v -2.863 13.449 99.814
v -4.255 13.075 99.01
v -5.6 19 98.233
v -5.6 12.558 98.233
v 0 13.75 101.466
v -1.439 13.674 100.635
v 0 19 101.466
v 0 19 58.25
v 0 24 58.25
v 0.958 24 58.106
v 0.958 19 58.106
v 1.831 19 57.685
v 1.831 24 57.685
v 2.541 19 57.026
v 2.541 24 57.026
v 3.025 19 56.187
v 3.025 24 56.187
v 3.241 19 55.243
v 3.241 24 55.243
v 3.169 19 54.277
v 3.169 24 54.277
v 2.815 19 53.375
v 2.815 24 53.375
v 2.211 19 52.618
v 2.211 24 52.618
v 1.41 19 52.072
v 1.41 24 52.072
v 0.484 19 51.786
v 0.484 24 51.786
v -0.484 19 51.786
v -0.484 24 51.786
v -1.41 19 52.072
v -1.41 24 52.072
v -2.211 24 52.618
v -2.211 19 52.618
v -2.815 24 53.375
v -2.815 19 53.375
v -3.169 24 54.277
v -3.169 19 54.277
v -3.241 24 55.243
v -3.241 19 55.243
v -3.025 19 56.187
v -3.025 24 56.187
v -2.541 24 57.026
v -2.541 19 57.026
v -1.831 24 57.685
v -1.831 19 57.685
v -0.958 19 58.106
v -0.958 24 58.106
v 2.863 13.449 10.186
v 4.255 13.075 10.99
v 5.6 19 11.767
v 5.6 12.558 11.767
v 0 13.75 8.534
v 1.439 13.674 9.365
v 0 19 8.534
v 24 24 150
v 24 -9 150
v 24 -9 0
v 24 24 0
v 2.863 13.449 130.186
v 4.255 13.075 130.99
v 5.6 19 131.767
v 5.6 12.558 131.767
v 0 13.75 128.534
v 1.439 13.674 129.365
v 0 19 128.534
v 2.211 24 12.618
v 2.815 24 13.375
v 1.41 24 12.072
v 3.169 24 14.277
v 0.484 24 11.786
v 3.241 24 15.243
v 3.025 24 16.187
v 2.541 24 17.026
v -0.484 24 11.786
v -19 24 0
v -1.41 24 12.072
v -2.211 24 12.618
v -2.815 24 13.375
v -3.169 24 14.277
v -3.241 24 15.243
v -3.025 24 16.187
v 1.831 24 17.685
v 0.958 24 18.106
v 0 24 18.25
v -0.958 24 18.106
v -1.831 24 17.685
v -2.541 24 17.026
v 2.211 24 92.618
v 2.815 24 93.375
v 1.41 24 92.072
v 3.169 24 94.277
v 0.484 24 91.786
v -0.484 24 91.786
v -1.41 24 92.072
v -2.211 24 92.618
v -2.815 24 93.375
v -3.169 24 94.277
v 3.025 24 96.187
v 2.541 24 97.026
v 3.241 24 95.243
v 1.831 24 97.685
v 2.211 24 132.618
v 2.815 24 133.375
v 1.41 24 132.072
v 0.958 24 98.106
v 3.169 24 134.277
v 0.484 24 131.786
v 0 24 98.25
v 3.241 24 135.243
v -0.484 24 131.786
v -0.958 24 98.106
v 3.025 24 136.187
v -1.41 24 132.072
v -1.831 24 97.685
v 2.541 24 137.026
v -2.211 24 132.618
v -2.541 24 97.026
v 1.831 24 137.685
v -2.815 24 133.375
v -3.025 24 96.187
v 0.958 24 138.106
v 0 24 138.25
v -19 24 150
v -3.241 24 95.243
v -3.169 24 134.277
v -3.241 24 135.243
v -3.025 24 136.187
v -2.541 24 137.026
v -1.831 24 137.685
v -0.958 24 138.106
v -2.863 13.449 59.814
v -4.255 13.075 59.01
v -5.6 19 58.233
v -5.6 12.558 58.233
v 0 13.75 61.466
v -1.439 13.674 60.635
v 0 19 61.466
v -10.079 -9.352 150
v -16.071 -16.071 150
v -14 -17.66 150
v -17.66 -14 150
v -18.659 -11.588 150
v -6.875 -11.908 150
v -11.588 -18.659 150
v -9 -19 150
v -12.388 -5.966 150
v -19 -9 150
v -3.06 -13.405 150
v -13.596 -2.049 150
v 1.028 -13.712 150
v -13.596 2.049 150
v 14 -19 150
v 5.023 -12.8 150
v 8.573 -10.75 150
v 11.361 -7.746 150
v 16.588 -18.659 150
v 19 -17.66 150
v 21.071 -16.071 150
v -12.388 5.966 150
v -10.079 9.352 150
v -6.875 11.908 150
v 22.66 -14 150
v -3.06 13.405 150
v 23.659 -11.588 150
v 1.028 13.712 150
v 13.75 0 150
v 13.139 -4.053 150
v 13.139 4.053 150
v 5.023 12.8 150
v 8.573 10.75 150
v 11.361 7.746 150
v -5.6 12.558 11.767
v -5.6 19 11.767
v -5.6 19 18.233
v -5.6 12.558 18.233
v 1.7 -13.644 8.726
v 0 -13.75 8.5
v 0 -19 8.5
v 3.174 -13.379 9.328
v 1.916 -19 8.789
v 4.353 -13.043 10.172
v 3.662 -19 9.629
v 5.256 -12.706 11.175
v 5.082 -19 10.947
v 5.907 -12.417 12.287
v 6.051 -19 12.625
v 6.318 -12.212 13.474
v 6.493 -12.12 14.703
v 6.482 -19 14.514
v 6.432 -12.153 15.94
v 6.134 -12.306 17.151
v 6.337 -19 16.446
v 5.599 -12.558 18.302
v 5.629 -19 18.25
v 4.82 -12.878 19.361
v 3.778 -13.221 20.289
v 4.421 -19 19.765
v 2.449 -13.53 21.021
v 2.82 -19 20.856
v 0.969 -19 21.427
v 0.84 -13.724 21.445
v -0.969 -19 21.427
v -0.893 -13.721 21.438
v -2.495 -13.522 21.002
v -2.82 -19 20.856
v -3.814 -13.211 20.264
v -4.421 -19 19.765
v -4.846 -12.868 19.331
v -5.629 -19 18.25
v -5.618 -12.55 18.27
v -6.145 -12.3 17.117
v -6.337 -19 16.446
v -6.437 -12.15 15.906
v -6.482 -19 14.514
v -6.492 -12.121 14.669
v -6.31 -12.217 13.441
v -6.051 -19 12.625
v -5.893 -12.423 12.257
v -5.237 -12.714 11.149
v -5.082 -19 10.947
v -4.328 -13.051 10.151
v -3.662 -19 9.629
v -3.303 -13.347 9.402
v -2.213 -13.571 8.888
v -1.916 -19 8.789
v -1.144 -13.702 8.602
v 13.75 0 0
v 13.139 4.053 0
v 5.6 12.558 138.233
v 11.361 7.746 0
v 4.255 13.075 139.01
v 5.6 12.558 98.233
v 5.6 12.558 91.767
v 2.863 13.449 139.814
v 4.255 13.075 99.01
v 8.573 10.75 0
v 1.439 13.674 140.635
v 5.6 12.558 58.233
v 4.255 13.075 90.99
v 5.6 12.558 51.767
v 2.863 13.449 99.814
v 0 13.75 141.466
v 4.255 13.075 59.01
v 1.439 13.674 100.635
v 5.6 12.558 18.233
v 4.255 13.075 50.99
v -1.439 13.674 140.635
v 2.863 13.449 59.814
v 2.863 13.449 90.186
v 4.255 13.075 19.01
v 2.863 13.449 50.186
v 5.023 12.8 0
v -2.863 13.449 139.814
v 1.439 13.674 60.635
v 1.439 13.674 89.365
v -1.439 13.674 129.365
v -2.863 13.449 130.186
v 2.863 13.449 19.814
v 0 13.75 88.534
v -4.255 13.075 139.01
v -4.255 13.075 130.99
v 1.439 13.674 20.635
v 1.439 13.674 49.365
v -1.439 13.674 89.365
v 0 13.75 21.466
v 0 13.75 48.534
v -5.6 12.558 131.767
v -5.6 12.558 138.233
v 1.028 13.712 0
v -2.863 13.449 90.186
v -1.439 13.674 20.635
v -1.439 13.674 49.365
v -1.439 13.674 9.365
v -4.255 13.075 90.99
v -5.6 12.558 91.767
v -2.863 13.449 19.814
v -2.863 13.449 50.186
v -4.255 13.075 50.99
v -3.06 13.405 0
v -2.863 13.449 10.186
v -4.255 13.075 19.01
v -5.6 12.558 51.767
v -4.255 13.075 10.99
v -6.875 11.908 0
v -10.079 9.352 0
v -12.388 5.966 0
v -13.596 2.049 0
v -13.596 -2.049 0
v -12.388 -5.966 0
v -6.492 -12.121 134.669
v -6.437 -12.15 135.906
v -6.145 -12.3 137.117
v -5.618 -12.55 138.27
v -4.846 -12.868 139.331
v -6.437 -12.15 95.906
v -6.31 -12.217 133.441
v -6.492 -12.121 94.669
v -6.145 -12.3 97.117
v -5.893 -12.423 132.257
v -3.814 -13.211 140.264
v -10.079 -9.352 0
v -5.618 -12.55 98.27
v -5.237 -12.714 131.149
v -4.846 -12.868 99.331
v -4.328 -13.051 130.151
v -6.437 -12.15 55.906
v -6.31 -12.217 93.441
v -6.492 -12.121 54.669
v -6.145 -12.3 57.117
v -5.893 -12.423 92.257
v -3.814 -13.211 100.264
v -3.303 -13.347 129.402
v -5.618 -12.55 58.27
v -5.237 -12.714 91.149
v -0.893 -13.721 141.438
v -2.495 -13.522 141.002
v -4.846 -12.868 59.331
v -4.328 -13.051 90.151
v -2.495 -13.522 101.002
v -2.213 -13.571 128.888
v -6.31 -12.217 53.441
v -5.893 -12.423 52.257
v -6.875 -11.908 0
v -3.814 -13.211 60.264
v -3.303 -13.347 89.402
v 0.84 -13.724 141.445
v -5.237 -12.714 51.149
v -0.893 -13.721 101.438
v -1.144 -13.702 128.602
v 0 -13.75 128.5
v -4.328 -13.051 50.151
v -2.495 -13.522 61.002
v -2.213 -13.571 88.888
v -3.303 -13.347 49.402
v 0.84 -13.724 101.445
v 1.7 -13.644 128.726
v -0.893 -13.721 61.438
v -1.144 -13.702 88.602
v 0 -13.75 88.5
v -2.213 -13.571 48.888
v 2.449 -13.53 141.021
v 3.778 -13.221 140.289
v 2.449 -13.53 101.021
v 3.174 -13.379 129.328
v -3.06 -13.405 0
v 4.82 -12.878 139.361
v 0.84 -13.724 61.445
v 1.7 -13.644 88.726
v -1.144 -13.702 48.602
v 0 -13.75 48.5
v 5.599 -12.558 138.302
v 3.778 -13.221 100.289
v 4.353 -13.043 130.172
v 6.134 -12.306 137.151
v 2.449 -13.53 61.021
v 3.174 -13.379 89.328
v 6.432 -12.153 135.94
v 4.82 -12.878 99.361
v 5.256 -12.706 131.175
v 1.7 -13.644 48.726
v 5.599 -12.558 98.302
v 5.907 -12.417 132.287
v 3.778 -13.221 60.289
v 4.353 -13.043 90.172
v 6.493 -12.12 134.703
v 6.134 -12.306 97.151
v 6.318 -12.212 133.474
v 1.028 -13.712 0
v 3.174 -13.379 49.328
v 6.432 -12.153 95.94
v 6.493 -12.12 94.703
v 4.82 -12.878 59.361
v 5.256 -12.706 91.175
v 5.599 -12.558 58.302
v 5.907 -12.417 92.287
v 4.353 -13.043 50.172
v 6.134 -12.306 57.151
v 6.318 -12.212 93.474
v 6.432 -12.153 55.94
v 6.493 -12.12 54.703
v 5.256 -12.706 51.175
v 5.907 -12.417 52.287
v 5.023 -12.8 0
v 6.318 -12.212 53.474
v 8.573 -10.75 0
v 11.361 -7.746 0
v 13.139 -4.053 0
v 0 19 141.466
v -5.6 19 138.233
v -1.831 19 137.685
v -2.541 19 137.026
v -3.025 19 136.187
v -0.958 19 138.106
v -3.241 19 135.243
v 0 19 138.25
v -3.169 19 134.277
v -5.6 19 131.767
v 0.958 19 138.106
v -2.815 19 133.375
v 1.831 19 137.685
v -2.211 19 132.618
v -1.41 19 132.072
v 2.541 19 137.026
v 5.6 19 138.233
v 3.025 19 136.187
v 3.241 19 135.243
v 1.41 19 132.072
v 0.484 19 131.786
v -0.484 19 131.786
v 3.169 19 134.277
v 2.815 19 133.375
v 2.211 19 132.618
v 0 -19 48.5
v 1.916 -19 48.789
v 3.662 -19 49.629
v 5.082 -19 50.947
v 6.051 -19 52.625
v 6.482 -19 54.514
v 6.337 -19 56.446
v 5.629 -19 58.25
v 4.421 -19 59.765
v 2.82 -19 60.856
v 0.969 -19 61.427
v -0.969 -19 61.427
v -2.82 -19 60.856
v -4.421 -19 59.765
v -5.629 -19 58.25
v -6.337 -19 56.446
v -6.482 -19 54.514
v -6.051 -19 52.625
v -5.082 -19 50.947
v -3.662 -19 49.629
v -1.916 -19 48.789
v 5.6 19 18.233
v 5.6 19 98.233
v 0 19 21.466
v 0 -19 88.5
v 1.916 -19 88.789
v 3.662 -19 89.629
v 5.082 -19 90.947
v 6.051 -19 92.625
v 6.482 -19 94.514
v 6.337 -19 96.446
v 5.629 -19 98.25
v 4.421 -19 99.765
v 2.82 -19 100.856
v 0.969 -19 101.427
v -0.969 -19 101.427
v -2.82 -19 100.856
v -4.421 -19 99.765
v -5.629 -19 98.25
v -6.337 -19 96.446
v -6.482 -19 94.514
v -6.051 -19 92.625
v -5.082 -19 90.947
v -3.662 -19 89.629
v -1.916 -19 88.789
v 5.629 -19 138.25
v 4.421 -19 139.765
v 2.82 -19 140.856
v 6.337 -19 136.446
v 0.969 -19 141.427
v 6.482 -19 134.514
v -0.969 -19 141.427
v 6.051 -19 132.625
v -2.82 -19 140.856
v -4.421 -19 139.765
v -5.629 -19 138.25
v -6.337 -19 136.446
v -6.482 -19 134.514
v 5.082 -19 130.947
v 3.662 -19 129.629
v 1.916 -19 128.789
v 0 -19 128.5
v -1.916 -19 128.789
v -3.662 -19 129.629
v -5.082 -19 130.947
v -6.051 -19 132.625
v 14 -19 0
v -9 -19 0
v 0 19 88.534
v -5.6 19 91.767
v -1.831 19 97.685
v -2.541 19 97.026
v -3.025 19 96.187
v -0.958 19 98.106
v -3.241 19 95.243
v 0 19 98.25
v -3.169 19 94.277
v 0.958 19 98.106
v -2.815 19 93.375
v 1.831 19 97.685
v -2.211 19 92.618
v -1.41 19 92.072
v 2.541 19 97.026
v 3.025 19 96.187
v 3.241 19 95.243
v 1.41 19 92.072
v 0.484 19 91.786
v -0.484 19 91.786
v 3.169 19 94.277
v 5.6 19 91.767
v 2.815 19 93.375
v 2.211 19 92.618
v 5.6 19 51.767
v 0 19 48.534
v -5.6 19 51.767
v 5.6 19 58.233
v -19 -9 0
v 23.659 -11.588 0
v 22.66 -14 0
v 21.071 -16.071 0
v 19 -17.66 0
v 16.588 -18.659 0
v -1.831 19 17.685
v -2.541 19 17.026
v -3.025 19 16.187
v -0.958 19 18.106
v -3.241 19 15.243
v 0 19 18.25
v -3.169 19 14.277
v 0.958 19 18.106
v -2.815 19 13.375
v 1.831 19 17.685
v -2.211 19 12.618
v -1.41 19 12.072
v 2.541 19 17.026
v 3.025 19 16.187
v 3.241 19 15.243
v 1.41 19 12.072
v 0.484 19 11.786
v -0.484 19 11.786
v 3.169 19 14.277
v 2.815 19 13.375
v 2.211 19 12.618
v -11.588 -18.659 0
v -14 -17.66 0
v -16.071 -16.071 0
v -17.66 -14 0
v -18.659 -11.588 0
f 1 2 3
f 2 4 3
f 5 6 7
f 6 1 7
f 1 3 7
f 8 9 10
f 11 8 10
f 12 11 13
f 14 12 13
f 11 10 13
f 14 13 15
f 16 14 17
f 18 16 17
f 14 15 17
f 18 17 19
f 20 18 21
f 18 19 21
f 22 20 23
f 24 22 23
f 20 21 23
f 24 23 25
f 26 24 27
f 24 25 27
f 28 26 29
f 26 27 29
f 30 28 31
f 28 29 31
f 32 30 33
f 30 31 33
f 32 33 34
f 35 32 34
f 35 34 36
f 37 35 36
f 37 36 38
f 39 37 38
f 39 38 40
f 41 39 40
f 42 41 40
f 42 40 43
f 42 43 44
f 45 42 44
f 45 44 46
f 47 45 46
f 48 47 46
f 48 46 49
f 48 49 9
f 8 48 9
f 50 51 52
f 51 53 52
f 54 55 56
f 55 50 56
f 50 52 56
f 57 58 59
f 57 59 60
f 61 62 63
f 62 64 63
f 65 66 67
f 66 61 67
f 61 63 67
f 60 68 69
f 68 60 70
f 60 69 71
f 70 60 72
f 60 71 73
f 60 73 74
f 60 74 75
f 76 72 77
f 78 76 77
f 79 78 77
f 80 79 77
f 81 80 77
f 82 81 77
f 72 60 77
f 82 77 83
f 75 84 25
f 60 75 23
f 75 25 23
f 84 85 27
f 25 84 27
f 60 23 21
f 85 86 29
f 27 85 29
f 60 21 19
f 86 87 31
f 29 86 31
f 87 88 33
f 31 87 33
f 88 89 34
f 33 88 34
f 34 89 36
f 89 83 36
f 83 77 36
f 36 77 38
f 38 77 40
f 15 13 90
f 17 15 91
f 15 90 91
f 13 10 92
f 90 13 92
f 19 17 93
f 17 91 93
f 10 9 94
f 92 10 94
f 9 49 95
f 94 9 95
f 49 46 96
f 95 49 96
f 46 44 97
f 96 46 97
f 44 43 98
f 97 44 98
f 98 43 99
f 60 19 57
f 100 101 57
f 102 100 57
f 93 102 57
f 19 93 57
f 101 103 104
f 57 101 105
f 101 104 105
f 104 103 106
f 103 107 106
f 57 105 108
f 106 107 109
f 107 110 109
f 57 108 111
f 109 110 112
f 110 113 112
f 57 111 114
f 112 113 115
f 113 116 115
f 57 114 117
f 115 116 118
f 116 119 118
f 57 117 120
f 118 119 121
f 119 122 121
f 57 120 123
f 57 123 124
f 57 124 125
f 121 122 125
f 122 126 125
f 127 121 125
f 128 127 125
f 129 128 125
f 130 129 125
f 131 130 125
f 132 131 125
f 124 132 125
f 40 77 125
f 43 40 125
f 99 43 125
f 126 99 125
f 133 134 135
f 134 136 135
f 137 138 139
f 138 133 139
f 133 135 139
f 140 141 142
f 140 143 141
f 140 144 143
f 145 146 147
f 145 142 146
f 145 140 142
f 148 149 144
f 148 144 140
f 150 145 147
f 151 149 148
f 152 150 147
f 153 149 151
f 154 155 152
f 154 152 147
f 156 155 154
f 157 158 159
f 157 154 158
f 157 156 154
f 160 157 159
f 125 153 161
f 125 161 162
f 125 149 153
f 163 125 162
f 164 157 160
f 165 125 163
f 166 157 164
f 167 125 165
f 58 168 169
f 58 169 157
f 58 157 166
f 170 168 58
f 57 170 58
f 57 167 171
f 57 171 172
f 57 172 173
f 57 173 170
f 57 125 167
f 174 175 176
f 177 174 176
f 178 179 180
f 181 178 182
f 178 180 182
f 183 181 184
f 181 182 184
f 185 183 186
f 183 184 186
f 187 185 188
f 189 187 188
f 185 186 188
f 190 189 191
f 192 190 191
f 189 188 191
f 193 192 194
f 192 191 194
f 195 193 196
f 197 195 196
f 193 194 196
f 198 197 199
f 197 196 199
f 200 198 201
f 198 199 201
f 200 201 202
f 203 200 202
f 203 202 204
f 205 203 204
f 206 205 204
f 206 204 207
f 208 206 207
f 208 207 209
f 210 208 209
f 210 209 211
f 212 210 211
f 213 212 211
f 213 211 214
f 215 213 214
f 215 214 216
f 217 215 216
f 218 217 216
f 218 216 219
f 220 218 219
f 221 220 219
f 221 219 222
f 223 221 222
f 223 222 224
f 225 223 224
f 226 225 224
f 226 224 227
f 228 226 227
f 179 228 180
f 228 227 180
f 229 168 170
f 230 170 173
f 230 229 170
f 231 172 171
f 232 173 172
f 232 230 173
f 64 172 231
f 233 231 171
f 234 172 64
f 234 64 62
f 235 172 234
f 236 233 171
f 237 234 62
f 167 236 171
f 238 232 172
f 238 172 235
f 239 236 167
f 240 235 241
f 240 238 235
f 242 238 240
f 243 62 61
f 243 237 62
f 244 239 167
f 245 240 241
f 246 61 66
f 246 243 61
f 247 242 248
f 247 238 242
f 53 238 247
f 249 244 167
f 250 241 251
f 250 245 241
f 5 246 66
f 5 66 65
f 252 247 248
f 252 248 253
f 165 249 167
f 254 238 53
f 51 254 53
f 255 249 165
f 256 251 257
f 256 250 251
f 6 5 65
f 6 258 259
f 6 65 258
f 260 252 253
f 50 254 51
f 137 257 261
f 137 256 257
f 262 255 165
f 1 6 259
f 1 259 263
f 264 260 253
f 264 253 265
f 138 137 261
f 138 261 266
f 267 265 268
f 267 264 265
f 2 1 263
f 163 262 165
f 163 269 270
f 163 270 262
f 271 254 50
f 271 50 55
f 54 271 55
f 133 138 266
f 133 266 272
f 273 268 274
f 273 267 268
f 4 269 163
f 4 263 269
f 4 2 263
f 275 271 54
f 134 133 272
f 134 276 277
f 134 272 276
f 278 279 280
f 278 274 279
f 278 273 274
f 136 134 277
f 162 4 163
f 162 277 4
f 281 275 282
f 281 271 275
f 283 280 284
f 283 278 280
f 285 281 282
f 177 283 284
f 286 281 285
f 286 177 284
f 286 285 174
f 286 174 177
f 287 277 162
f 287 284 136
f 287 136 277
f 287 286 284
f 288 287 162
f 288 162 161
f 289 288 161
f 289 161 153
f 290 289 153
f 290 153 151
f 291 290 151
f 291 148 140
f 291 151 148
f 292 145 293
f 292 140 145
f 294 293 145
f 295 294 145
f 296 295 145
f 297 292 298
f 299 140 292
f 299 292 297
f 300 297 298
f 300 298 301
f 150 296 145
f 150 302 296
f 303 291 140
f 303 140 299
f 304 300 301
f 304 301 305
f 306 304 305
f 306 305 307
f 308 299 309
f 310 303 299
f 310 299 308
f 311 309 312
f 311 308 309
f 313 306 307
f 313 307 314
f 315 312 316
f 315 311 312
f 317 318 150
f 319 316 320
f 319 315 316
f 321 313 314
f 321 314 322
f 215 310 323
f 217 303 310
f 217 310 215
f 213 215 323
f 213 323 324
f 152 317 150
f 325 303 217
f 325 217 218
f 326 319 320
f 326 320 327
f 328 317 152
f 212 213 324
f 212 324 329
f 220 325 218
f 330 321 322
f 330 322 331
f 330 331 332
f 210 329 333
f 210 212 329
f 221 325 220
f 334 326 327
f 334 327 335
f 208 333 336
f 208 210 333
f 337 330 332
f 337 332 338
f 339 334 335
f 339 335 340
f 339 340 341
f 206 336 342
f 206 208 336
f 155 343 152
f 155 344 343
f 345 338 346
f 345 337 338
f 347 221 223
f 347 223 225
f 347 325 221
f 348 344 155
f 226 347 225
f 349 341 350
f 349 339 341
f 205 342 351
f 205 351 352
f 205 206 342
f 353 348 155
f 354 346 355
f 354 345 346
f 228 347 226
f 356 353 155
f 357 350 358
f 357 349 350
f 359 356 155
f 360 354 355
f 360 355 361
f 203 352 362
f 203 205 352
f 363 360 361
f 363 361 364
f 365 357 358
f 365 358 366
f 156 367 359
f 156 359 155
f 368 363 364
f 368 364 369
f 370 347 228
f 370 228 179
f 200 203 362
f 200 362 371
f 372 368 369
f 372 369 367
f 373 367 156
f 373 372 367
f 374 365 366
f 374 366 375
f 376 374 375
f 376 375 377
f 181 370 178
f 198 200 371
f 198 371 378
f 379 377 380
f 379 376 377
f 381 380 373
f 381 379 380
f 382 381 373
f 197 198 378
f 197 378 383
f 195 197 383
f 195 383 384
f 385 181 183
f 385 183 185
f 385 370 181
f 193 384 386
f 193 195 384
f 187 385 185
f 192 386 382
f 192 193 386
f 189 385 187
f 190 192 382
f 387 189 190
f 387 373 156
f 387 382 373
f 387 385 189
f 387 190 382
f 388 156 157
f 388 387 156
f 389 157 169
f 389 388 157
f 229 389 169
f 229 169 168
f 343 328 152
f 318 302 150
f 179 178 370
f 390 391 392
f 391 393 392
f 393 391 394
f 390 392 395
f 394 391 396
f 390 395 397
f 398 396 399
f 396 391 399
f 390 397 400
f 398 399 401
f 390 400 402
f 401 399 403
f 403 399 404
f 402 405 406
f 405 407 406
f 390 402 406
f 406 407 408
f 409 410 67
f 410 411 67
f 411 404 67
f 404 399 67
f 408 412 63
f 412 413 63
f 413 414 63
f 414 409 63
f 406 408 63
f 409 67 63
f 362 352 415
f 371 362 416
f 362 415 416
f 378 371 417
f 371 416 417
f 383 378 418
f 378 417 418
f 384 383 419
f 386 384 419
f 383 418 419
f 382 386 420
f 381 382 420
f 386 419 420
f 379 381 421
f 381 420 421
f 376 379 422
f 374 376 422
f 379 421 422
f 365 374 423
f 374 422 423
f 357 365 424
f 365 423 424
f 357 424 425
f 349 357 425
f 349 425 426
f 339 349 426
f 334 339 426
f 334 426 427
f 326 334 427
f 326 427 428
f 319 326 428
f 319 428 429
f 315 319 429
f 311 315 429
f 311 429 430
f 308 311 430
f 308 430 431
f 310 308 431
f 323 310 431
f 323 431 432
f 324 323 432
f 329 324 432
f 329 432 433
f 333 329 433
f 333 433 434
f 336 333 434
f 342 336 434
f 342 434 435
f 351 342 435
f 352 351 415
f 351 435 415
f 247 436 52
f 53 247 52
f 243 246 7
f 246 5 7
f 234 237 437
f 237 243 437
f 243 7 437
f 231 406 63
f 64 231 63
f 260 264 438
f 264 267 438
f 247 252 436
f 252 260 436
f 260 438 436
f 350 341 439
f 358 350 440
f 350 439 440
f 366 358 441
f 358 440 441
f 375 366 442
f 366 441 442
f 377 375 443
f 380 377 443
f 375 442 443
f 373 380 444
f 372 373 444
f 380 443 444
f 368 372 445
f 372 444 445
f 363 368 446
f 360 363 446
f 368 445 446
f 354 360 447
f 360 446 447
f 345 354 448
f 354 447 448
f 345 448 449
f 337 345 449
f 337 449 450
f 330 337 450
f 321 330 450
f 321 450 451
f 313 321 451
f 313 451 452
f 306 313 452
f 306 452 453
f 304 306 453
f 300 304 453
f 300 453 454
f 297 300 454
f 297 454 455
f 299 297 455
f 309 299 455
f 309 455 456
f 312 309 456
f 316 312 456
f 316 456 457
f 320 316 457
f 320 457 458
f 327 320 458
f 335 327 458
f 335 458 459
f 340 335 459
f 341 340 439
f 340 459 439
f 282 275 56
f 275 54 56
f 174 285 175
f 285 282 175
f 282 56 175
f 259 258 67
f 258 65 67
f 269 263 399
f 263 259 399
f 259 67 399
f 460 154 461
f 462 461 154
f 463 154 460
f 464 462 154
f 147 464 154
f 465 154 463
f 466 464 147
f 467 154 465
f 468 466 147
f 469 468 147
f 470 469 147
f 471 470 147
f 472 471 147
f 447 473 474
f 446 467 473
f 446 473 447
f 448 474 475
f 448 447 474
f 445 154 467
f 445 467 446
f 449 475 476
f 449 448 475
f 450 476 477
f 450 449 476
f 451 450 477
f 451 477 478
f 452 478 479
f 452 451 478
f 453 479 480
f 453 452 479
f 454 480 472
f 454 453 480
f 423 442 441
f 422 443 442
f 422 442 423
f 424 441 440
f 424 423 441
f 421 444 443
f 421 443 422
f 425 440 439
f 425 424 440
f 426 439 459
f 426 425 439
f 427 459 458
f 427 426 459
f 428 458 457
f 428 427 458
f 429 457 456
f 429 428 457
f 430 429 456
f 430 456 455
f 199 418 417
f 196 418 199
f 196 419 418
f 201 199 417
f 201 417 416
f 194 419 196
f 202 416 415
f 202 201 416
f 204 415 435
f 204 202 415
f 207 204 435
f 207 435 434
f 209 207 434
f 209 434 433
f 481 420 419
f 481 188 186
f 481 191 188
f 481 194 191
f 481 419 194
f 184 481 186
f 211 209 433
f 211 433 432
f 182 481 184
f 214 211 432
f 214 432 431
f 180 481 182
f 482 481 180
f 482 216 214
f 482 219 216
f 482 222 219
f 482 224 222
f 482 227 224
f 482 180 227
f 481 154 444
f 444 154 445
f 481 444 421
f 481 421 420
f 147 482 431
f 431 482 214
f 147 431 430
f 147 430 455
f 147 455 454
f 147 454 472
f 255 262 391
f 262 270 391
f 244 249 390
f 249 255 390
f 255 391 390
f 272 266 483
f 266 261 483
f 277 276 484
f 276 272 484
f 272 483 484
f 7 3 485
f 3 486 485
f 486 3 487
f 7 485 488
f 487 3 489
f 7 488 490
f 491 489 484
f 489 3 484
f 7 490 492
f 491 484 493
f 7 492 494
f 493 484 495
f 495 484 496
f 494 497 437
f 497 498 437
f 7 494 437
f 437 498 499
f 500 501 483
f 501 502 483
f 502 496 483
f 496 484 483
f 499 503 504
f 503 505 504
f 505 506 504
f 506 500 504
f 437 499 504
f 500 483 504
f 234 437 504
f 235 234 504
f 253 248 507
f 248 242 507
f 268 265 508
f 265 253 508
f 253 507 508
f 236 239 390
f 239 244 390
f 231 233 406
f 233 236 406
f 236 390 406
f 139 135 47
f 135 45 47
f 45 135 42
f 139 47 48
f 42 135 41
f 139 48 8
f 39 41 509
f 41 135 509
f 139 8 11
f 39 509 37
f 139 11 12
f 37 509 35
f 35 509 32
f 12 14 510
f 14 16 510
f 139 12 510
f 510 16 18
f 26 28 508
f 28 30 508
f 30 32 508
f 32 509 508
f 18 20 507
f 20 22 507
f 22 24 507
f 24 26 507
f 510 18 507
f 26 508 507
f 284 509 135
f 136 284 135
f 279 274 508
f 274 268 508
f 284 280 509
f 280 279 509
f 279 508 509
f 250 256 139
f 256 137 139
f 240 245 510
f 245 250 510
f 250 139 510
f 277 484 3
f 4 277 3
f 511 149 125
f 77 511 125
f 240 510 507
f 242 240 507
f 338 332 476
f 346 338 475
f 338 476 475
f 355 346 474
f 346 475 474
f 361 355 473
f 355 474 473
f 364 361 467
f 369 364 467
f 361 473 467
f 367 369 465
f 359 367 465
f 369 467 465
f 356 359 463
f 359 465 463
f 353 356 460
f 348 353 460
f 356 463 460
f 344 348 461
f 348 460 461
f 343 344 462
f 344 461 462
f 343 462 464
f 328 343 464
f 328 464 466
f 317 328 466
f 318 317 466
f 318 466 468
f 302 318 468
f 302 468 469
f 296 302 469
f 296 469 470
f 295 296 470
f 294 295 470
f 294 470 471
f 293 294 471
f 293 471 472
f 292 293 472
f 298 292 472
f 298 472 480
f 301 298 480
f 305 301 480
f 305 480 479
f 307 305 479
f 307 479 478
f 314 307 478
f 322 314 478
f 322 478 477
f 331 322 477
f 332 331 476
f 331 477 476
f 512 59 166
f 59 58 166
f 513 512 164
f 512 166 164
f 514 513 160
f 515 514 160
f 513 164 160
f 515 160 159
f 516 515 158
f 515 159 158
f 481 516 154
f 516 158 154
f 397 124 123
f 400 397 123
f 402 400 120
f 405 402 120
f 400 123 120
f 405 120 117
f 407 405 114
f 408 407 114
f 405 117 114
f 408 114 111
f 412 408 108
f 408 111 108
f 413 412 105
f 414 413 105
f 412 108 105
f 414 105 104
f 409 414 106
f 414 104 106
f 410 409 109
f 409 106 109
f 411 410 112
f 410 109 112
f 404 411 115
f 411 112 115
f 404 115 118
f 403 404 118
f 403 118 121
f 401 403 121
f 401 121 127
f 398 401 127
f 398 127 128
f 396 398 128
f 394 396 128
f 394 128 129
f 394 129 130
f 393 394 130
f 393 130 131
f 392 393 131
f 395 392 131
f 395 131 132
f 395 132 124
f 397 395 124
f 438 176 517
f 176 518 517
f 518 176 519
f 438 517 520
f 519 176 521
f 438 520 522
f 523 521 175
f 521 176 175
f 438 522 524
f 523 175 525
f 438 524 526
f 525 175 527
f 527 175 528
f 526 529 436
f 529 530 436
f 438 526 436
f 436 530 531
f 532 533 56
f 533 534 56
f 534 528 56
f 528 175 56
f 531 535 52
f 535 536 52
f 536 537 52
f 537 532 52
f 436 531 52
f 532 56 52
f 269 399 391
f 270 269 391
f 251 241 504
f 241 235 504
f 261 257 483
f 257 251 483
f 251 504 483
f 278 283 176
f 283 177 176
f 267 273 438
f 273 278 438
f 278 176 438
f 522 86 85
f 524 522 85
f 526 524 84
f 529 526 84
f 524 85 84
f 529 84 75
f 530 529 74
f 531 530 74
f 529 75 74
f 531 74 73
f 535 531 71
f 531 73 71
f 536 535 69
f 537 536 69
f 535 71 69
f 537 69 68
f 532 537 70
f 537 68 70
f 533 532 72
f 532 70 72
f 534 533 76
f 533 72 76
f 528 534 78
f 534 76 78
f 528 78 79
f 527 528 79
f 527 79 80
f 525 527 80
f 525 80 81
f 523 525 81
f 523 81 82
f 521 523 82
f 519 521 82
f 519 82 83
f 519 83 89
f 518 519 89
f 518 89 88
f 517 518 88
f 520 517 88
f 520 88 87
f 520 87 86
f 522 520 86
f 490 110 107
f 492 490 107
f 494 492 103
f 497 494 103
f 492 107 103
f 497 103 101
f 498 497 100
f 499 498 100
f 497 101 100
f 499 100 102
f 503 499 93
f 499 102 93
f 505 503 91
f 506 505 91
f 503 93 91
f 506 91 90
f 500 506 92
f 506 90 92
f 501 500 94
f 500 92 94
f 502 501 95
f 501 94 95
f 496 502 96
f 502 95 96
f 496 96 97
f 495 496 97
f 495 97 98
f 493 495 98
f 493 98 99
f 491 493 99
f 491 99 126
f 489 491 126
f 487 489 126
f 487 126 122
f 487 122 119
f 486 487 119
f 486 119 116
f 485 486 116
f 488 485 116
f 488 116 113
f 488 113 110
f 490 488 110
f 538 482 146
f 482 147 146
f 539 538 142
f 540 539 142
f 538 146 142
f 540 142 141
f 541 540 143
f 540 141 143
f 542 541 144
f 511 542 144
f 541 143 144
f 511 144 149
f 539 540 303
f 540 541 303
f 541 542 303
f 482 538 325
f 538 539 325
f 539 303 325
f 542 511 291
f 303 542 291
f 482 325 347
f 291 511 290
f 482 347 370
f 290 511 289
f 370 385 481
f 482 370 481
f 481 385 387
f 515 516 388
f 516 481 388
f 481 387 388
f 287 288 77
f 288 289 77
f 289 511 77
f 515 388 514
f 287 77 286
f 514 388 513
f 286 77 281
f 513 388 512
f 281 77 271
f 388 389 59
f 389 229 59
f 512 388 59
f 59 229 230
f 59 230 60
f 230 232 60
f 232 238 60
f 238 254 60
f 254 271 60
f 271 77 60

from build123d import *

# Parameters (mm, degrees)
SKETCH1_W               = 38
SKETCH1_H               = 48
SKETCH1_R               = 13.75
SKETCH1_H_2             = 10
BOSS_EXTRUDE1_DEPTH     = 230
SKETCH3_R               = 6
CUT_EXTRUDE1_DEPTH      = 0.5
SKETCH4_R               = 3.25
CUT_EXTRUDE2_DEPTH      = 239.706179225
CUT_EXTRUDE3_REACH      = 240.706
CUT_EXTRUDE3_END_RADIUS = 13.75
SKETCH5_R               = 6.5
CUT_EXTRUDE4_REACH      = 243.178
CUT_EXTRUDE4_END_RADIUS = 13.75
CUT_EXTRUDE4_START      = -5
CHAMFER1_SIZE           = 5
SKETCH8_W               = 230
SKETCH8_H               = 1.2
CUT_EXTRUDE6_DEPTH      = 10
SKETCH9_W               = 43
SKETCH9_H               = 80
CUT_EXTRUDE7_DEPTH      = 237.177899168
SKETCH10_W              = 43
SKETCH10_H              = 5
CUT_EXTRUDE8_DEPTH      = 154.792067529
FILLET1_R               = 10


with BuildPart() as part:
    # Sketch1 → Boss-Extrude1 (new body)
    # profile 1 of 3: a face of its own
    with BuildSketch(Plane.XY):
        Rectangle(SKETCH1_W, SKETCH1_H)
        Circle(SKETCH1_R, mode=Mode.SUBTRACT)
    # profile 2 of 3: a face of its own
    with BuildSketch(Plane.XY):
        with Locations((0, 30.2)):
            Rectangle(SKETCH1_W, SKETCH1_H_2)
    # profile 3 of 3: a face of its own
    with BuildSketch(Plane.XY):
        Polygon((19, 24), (19, -24), (24, -24), (24, 35.2), (19, 35.2), (19, 25.2), align=None)
    extrude(amount=BOSS_EXTRUDE1_DEPTH)

    # Sketch3 → Cut-Extrude1 (cut)
    with BuildSketch(Plane(origin=(0, 35.2, 0), x_dir=(1, 0, 0), z_dir=(0, 1, 0))):
        with Locations(Location((0, -15, 0), (0, 0, 270))):
            Circle(SKETCH3_R)
        with Locations(Location((0, -55, 0), (0, 0, 270))):
            Circle(SKETCH3_R)
        with Locations(Location((0, -95, 0), (0, 0, 270))):
            Circle(SKETCH3_R)
        with Locations(Location((0, -135, 0), (0, 0, 270))):
            Circle(SKETCH3_R)
        with Locations(Location((0, -175, 0), (0, 0, 270))):
            Circle(SKETCH3_R)
        with Locations(Location((0, -215, 0), (0, 0, 270))):
            Circle(SKETCH3_R)
    extrude(amount=-CUT_EXTRUDE1_DEPTH, mode=Mode.SUBTRACT)

    # Sketch4 → Cut-Extrude2 (cut, through all)
    with BuildSketch(Plane(origin=(0, 35.2, 0), x_dir=(1, 0, 0), z_dir=(0, 1, 0))):
        with Locations(Location((0, -15, 0), (0, 0, 270))):
            Circle(SKETCH4_R)
        with Locations(Location((0, -55, 0), (0, 0, 270))):
            Circle(SKETCH4_R)
        with Locations(Location((0, -95, 0), (0, 0, 270))):
            Circle(SKETCH4_R)
        with Locations(Location((0, -135, 0), (0, 0, 270))):
            Circle(SKETCH4_R)
        with Locations(Location((0, -175, 0), (0, 0, 270))):
            Circle(SKETCH4_R)
        with Locations(Location((0, -215, 0), (0, 0, 270))):
            Circle(SKETCH4_R)
    extrude(amount=-CUT_EXTRUDE2_DEPTH, mode=Mode.SUBTRACT)

    # Cut-Extrude3: up to this cylinder (the profile starts outside it)
    cut_extrude3_end = Plane(origin=(0, 0, 115), z_dir=(0, 0, -1)) * Cylinder(CUT_EXTRUDE3_END_RADIUS, 709.912, mode=Mode.PRIVATE)
    # Sketch5 → Cut-Extrude3 (cut, up to the surface)
    with BuildSketch(Plane.XZ.offset(24), mode=Mode.PRIVATE) as cut_extrude3_sk1:
        with Locations(Location((0, 215, 0), (0, 0, 270))):
            Circle(SKETCH5_R)
    cut_extrude3_tool1 = extrude(cut_extrude3_sk1.sketch, amount=-CUT_EXTRUDE3_REACH, mode=Mode.PRIVATE) - cut_extrude3_end
    add(cut_extrude3_tool1.solids().sort_by_distance((0, -24, 215))[0], mode=Mode.SUBTRACT)
    # Sketch5 → Cut-Extrude3 (cut, up to the surface)
    with BuildSketch(Plane.XZ.offset(24), mode=Mode.PRIVATE) as cut_extrude3_sk2:
        with Locations(Location((0, 175, 0), (0, 0, 270))):
            Circle(SKETCH5_R)
    cut_extrude3_tool2 = extrude(cut_extrude3_sk2.sketch, amount=-CUT_EXTRUDE3_REACH, mode=Mode.PRIVATE) - cut_extrude3_end
    add(cut_extrude3_tool2.solids().sort_by_distance((0, -24, 175))[0], mode=Mode.SUBTRACT)
    # Sketch5 → Cut-Extrude3 (cut, up to the surface)
    with BuildSketch(Plane.XZ.offset(24), mode=Mode.PRIVATE) as cut_extrude3_sk3:
        with Locations(Location((0, 135, 0), (0, 0, 270))):
            Circle(SKETCH5_R)
    cut_extrude3_tool3 = extrude(cut_extrude3_sk3.sketch, amount=-CUT_EXTRUDE3_REACH, mode=Mode.PRIVATE) - cut_extrude3_end
    add(cut_extrude3_tool3.solids().sort_by_distance((0, -24, 135))[0], mode=Mode.SUBTRACT)
    # Sketch5 → Cut-Extrude3 (cut, up to the surface)
    with BuildSketch(Plane.XZ.offset(24), mode=Mode.PRIVATE) as cut_extrude3_sk4:
        with Locations(Location((0, 95, 0), (0, 0, 270))):
            Circle(SKETCH5_R)
    cut_extrude3_tool4 = extrude(cut_extrude3_sk4.sketch, amount=-CUT_EXTRUDE3_REACH, mode=Mode.PRIVATE) - cut_extrude3_end
    add(cut_extrude3_tool4.solids().sort_by_distance((0, -24, 95))[0], mode=Mode.SUBTRACT)
    # Sketch5 → Cut-Extrude3 (cut, up to the surface)
    with BuildSketch(Plane.XZ.offset(24), mode=Mode.PRIVATE) as cut_extrude3_sk5:
        with Locations(Location((0, 55, 0), (0, 0, 270))):
            Circle(SKETCH5_R)
    cut_extrude3_tool5 = extrude(cut_extrude3_sk5.sketch, amount=-CUT_EXTRUDE3_REACH, mode=Mode.PRIVATE) - cut_extrude3_end
    add(cut_extrude3_tool5.solids().sort_by_distance((0, -24, 55))[0], mode=Mode.SUBTRACT)
    # Sketch5 → Cut-Extrude3 (cut, up to the surface)
    with BuildSketch(Plane.XZ.offset(24), mode=Mode.PRIVATE) as cut_extrude3_sk6:
        with Locations(Location((0, 15, 0), (0, 0, 270))):
            Circle(SKETCH5_R)
    cut_extrude3_tool6 = extrude(cut_extrude3_sk6.sketch, amount=-CUT_EXTRUDE3_REACH, mode=Mode.PRIVATE) - cut_extrude3_end
    add(cut_extrude3_tool6.solids().sort_by_distance((0, -24, 15))[0], mode=Mode.SUBTRACT)

    # Cut-Extrude4: up to this cylinder (the profile starts outside it)
    cut_extrude4_end = Plane(origin=(0, 0, 115), z_dir=(0, 0, -1)) * Cylinder(CUT_EXTRUDE4_END_RADIUS, 714.856, mode=Mode.PRIVATE)
    # Sketch7 → Cut-Extrude4 (cut, up to the surface)
    with BuildSketch(Plane(origin=(0, 24, 0), x_dir=(1, 0, 0), z_dir=(0, 1, 0)).offset(CUT_EXTRUDE4_START), mode=Mode.PRIVATE) as cut_extrude4_sk1:
        Polygon((0, -8.533676985), (-5.6, -11.766838493), (-5.6, -18.233161507), (0, -21.466323015), (5.6, -18.233161507), (5.6, -11.766838493), align=None)
    cut_extrude4_tool1 = extrude(cut_extrude4_sk1.sketch, amount=-CUT_EXTRUDE4_REACH, mode=Mode.PRIVATE) - cut_extrude4_end
    add(cut_extrude4_tool1.solids().sort_by_distance((0, 19, 15))[0], mode=Mode.SUBTRACT)
    # Sketch7 → Cut-Extrude4 (cut, up to the surface)
    with BuildSketch(Plane(origin=(0, 24, 0), x_dir=(1, 0, 0), z_dir=(0, 1, 0)).offset(CUT_EXTRUDE4_START), mode=Mode.PRIVATE) as cut_extrude4_sk2:
        Polygon((0, -48.533676985), (-5.6, -51.766838493), (-5.6, -58.233161507), (0, -61.466323015), (5.6, -58.233161507), (5.6, -51.766838493), align=None)
    cut_extrude4_tool2 = extrude(cut_extrude4_sk2.sketch, amount=-CUT_EXTRUDE4_REACH, mode=Mode.PRIVATE) - cut_extrude4_end
    add(cut_extrude4_tool2.solids().sort_by_distance((0, 19, 55))[0], mode=Mode.SUBTRACT)
    # Sketch7 → Cut-Extrude4 (cut, up to the surface)
    with BuildSketch(Plane(origin=(0, 24, 0), x_dir=(1, 0, 0), z_dir=(0, 1, 0)).offset(CUT_EXTRUDE4_START), mode=Mode.PRIVATE) as cut_extrude4_sk3:
        Polygon((0, -88.533676985), (-5.6, -91.766838493), (-5.6, -98.233161507), (0, -101.466323015), (5.6, -98.233161507), (5.6, -91.766838493), align=None)
    cut_extrude4_tool3 = extrude(cut_extrude4_sk3.sketch, amount=-CUT_EXTRUDE4_REACH, mode=Mode.PRIVATE) - cut_extrude4_end
    add(cut_extrude4_tool3.solids().sort_by_distance((0, 19, 95))[0], mode=Mode.SUBTRACT)
    # Sketch7 → Cut-Extrude4 (cut, up to the surface)
    with BuildSketch(Plane(origin=(0, 24, 0), x_dir=(1, 0, 0), z_dir=(0, 1, 0)).offset(CUT_EXTRUDE4_START), mode=Mode.PRIVATE) as cut_extrude4_sk4:
        Polygon((0, -128.533676985), (-5.6, -131.766838493), (-5.6, -138.233161507), (0, -141.466323015), (5.6, -138.233161507), (5.6, -131.766838493), align=None)
    cut_extrude4_tool4 = extrude(cut_extrude4_sk4.sketch, amount=-CUT_EXTRUDE4_REACH, mode=Mode.PRIVATE) - cut_extrude4_end
    add(cut_extrude4_tool4.solids().sort_by_distance((0, 19, 135))[0], mode=Mode.SUBTRACT)
    # Sketch7 → Cut-Extrude4 (cut, up to the surface)
    with BuildSketch(Plane(origin=(0, 24, 0), x_dir=(1, 0, 0), z_dir=(0, 1, 0)).offset(CUT_EXTRUDE4_START), mode=Mode.PRIVATE) as cut_extrude4_sk5:
        Polygon((0, -168.533676985), (-5.6, -171.766838493), (-5.6, -178.233161507), (0, -181.466323015), (5.6, -178.233161507), (5.6, -171.766838493), align=None)
    cut_extrude4_tool5 = extrude(cut_extrude4_sk5.sketch, amount=-CUT_EXTRUDE4_REACH, mode=Mode.PRIVATE) - cut_extrude4_end
    add(cut_extrude4_tool5.solids().sort_by_distance((0, 19, 175))[0], mode=Mode.SUBTRACT)
    # Sketch7 → Cut-Extrude4 (cut, up to the surface)
    with BuildSketch(Plane(origin=(0, 24, 0), x_dir=(1, 0, 0), z_dir=(0, 1, 0)).offset(CUT_EXTRUDE4_START), mode=Mode.PRIVATE) as cut_extrude4_sk6:
        Polygon((0, -208.533676985), (-5.6, -211.766838493), (-5.6, -218.233161507), (0, -221.466323015), (5.6, -218.233161507), (5.6, -211.766838493), align=None)
    cut_extrude4_tool6 = extrude(cut_extrude4_sk6.sketch, amount=-CUT_EXTRUDE4_REACH, mode=Mode.PRIVATE) - cut_extrude4_end
    add(cut_extrude4_tool6.solids().sort_by_distance((0, 19, 215))[0], mode=Mode.SUBTRACT)

    # Chamfer1
    # the kernel refuses this chamfer: 5 mm, written as the material it takes off along each edge
    with BuildSketch(Plane(origin=(0, 34.7, 215), x_dir=(0, 0, 1), z_dir=(-1, 0, 0))) as chamfer1_piece_1_section:
        Polygon((3.25, -CHAMFER1_SIZE), (3.25 + CHAMFER1_SIZE, 0), (3.25, 0), align=None)
    chamfer1_piece_1 = revolve(axis=Axis((0, 34.7, 215), (0, 1, 0)), mode=Mode.PRIVATE)
    chamfer1_piece_1 = chamfer1_piece_1 & Plane(origin=(0, 31.051548399, 215), x_dir=(0, 0, 1), z_dir=(0, 1, 0)) * Cylinder(6, 33, mode=Mode.PRIVATE)
    add(chamfer1_piece_1, mode=Mode.SUBTRACT)
    with BuildSketch(Plane(origin=(0, 34.7, 175), x_dir=(0, 0, 1), z_dir=(-1, 0, 0))) as chamfer1_piece_2_section:
        Polygon((3.25, -CHAMFER1_SIZE), (3.25 + CHAMFER1_SIZE, 0), (3.25, 0), align=None)
    chamfer1_piece_2 = revolve(axis=Axis((0, 34.7, 175), (0, 1, 0)), mode=Mode.PRIVATE)
    chamfer1_piece_2 = chamfer1_piece_2 & Plane(origin=(0, 31.051548399, 175), x_dir=(0, 0, 1), z_dir=(0, 1, 0)) * Cylinder(6, 33, mode=Mode.PRIVATE)
    add(chamfer1_piece_2, mode=Mode.SUBTRACT)
    with BuildSketch(Plane(origin=(0, 34.7, 135), x_dir=(0, 0, 1), z_dir=(-1, 0, 0))) as chamfer1_piece_3_section:
        Polygon((3.25, -CHAMFER1_SIZE), (3.25 + CHAMFER1_SIZE, 0), (3.25, 0), align=None)
    chamfer1_piece_3 = revolve(axis=Axis((0, 34.7, 135), (0, 1, 0)), mode=Mode.PRIVATE)
    chamfer1_piece_3 = chamfer1_piece_3 & Plane(origin=(0, 31.051548399, 135), x_dir=(0, 0, 1), z_dir=(0, 1, 0)) * Cylinder(6, 33, mode=Mode.PRIVATE)
    add(chamfer1_piece_3, mode=Mode.SUBTRACT)
    with BuildSketch(Plane(origin=(0, 34.7, 95), x_dir=(0, 0, 1), z_dir=(-1, 0, 0))) as chamfer1_piece_4_section:
        Polygon((3.25, -CHAMFER1_SIZE), (3.25 + CHAMFER1_SIZE, 0), (3.25, 0), align=None)
    chamfer1_piece_4 = revolve(axis=Axis((0, 34.7, 95), (0, 1, 0)), mode=Mode.PRIVATE)
    chamfer1_piece_4 = chamfer1_piece_4 & Plane(origin=(0, 31.051548399, 95), x_dir=(0, 0, 1), z_dir=(0, 1, 0)) * Cylinder(6, 33, mode=Mode.PRIVATE)
    add(chamfer1_piece_4, mode=Mode.SUBTRACT)
    with BuildSketch(Plane(origin=(0, 34.7, 55), x_dir=(0, 0, 1), z_dir=(-1, 0, 0))) as chamfer1_piece_5_section:
        Polygon((3.25, -CHAMFER1_SIZE), (3.25 + CHAMFER1_SIZE, 0), (3.25, 0), align=None)
    chamfer1_piece_5 = revolve(axis=Axis((0, 34.7, 55), (0, 1, 0)), mode=Mode.PRIVATE)
    chamfer1_piece_5 = chamfer1_piece_5 & Plane(origin=(0, 31.051548399, 55), x_dir=(0, 0, 1), z_dir=(0, 1, 0)) * Cylinder(6, 33, mode=Mode.PRIVATE)
    add(chamfer1_piece_5, mode=Mode.SUBTRACT)
    with BuildSketch(Plane(origin=(0, 34.7, 15), x_dir=(0, 0, 1), z_dir=(-1, 0, 0))) as chamfer1_piece_6_section:
        Polygon((3.25, -CHAMFER1_SIZE), (3.25 + CHAMFER1_SIZE, 0), (3.25, 0), align=None)
    chamfer1_piece_6 = revolve(axis=Axis((0, 34.7, 15), (0, 1, 0)), mode=Mode.PRIVATE)
    chamfer1_piece_6 = chamfer1_piece_6 & Plane(origin=(0, 31.051548399, 15), x_dir=(0, 0, 1), z_dir=(0, 1, 0)) * Cylinder(6, 33, mode=Mode.PRIVATE)
    add(chamfer1_piece_6, mode=Mode.SUBTRACT)

    # Sketch8 → Cut-Extrude6 (cut)
    with BuildSketch(Plane.ZY.offset(-19)):
        with Locations((115, 24.6)):
            Rectangle(SKETCH8_W, SKETCH8_H)
    extrude(amount=-CUT_EXTRUDE6_DEPTH, mode=Mode.SUBTRACT)


with BuildPart() as cut_extrude6_kept_piece:
    # of the separate pieces the step leaves, the one the design keeps (cut_extrude6_pieces_kept)
    add(part.part.solids().sort_by_distance((-19, -24, 0))[0])

    # Sketch9 → Cut-Extrude7 (cut, through all)
    with BuildSketch(Plane(origin=(0, 24, 0), x_dir=(1, 0, 0), z_dir=(0, 1, 0))):
        with Locations((2.5, -190)):
            Rectangle(SKETCH9_W, SKETCH9_H)
    extrude(amount=-CUT_EXTRUDE7_DEPTH, mode=Mode.SUBTRACT)

    # Sketch10 → Cut-Extrude8 (cut, through all)
    with BuildSketch(Plane(origin=(0, 0, 0), x_dir=(-1, 0, 0), z_dir=(0, 0, -1))):
        with Locations((-2.5, -21.5)):
            Rectangle(SKETCH10_W, SKETCH10_H)
    extrude(amount=-CUT_EXTRUDE8_DEPTH, mode=Mode.SUBTRACT)

    # Fillet1
    fillet1_edges = [cut_extrude6_kept_piece.edges().sort_by_distance(p)[0] for p in [
        (24, -19, 75),
        (-19, -19, 75),
    ]]
    fillet(fillet1_edges, radius=FILLET1_R)


solid = cut_extrude6_kept_piece.part
